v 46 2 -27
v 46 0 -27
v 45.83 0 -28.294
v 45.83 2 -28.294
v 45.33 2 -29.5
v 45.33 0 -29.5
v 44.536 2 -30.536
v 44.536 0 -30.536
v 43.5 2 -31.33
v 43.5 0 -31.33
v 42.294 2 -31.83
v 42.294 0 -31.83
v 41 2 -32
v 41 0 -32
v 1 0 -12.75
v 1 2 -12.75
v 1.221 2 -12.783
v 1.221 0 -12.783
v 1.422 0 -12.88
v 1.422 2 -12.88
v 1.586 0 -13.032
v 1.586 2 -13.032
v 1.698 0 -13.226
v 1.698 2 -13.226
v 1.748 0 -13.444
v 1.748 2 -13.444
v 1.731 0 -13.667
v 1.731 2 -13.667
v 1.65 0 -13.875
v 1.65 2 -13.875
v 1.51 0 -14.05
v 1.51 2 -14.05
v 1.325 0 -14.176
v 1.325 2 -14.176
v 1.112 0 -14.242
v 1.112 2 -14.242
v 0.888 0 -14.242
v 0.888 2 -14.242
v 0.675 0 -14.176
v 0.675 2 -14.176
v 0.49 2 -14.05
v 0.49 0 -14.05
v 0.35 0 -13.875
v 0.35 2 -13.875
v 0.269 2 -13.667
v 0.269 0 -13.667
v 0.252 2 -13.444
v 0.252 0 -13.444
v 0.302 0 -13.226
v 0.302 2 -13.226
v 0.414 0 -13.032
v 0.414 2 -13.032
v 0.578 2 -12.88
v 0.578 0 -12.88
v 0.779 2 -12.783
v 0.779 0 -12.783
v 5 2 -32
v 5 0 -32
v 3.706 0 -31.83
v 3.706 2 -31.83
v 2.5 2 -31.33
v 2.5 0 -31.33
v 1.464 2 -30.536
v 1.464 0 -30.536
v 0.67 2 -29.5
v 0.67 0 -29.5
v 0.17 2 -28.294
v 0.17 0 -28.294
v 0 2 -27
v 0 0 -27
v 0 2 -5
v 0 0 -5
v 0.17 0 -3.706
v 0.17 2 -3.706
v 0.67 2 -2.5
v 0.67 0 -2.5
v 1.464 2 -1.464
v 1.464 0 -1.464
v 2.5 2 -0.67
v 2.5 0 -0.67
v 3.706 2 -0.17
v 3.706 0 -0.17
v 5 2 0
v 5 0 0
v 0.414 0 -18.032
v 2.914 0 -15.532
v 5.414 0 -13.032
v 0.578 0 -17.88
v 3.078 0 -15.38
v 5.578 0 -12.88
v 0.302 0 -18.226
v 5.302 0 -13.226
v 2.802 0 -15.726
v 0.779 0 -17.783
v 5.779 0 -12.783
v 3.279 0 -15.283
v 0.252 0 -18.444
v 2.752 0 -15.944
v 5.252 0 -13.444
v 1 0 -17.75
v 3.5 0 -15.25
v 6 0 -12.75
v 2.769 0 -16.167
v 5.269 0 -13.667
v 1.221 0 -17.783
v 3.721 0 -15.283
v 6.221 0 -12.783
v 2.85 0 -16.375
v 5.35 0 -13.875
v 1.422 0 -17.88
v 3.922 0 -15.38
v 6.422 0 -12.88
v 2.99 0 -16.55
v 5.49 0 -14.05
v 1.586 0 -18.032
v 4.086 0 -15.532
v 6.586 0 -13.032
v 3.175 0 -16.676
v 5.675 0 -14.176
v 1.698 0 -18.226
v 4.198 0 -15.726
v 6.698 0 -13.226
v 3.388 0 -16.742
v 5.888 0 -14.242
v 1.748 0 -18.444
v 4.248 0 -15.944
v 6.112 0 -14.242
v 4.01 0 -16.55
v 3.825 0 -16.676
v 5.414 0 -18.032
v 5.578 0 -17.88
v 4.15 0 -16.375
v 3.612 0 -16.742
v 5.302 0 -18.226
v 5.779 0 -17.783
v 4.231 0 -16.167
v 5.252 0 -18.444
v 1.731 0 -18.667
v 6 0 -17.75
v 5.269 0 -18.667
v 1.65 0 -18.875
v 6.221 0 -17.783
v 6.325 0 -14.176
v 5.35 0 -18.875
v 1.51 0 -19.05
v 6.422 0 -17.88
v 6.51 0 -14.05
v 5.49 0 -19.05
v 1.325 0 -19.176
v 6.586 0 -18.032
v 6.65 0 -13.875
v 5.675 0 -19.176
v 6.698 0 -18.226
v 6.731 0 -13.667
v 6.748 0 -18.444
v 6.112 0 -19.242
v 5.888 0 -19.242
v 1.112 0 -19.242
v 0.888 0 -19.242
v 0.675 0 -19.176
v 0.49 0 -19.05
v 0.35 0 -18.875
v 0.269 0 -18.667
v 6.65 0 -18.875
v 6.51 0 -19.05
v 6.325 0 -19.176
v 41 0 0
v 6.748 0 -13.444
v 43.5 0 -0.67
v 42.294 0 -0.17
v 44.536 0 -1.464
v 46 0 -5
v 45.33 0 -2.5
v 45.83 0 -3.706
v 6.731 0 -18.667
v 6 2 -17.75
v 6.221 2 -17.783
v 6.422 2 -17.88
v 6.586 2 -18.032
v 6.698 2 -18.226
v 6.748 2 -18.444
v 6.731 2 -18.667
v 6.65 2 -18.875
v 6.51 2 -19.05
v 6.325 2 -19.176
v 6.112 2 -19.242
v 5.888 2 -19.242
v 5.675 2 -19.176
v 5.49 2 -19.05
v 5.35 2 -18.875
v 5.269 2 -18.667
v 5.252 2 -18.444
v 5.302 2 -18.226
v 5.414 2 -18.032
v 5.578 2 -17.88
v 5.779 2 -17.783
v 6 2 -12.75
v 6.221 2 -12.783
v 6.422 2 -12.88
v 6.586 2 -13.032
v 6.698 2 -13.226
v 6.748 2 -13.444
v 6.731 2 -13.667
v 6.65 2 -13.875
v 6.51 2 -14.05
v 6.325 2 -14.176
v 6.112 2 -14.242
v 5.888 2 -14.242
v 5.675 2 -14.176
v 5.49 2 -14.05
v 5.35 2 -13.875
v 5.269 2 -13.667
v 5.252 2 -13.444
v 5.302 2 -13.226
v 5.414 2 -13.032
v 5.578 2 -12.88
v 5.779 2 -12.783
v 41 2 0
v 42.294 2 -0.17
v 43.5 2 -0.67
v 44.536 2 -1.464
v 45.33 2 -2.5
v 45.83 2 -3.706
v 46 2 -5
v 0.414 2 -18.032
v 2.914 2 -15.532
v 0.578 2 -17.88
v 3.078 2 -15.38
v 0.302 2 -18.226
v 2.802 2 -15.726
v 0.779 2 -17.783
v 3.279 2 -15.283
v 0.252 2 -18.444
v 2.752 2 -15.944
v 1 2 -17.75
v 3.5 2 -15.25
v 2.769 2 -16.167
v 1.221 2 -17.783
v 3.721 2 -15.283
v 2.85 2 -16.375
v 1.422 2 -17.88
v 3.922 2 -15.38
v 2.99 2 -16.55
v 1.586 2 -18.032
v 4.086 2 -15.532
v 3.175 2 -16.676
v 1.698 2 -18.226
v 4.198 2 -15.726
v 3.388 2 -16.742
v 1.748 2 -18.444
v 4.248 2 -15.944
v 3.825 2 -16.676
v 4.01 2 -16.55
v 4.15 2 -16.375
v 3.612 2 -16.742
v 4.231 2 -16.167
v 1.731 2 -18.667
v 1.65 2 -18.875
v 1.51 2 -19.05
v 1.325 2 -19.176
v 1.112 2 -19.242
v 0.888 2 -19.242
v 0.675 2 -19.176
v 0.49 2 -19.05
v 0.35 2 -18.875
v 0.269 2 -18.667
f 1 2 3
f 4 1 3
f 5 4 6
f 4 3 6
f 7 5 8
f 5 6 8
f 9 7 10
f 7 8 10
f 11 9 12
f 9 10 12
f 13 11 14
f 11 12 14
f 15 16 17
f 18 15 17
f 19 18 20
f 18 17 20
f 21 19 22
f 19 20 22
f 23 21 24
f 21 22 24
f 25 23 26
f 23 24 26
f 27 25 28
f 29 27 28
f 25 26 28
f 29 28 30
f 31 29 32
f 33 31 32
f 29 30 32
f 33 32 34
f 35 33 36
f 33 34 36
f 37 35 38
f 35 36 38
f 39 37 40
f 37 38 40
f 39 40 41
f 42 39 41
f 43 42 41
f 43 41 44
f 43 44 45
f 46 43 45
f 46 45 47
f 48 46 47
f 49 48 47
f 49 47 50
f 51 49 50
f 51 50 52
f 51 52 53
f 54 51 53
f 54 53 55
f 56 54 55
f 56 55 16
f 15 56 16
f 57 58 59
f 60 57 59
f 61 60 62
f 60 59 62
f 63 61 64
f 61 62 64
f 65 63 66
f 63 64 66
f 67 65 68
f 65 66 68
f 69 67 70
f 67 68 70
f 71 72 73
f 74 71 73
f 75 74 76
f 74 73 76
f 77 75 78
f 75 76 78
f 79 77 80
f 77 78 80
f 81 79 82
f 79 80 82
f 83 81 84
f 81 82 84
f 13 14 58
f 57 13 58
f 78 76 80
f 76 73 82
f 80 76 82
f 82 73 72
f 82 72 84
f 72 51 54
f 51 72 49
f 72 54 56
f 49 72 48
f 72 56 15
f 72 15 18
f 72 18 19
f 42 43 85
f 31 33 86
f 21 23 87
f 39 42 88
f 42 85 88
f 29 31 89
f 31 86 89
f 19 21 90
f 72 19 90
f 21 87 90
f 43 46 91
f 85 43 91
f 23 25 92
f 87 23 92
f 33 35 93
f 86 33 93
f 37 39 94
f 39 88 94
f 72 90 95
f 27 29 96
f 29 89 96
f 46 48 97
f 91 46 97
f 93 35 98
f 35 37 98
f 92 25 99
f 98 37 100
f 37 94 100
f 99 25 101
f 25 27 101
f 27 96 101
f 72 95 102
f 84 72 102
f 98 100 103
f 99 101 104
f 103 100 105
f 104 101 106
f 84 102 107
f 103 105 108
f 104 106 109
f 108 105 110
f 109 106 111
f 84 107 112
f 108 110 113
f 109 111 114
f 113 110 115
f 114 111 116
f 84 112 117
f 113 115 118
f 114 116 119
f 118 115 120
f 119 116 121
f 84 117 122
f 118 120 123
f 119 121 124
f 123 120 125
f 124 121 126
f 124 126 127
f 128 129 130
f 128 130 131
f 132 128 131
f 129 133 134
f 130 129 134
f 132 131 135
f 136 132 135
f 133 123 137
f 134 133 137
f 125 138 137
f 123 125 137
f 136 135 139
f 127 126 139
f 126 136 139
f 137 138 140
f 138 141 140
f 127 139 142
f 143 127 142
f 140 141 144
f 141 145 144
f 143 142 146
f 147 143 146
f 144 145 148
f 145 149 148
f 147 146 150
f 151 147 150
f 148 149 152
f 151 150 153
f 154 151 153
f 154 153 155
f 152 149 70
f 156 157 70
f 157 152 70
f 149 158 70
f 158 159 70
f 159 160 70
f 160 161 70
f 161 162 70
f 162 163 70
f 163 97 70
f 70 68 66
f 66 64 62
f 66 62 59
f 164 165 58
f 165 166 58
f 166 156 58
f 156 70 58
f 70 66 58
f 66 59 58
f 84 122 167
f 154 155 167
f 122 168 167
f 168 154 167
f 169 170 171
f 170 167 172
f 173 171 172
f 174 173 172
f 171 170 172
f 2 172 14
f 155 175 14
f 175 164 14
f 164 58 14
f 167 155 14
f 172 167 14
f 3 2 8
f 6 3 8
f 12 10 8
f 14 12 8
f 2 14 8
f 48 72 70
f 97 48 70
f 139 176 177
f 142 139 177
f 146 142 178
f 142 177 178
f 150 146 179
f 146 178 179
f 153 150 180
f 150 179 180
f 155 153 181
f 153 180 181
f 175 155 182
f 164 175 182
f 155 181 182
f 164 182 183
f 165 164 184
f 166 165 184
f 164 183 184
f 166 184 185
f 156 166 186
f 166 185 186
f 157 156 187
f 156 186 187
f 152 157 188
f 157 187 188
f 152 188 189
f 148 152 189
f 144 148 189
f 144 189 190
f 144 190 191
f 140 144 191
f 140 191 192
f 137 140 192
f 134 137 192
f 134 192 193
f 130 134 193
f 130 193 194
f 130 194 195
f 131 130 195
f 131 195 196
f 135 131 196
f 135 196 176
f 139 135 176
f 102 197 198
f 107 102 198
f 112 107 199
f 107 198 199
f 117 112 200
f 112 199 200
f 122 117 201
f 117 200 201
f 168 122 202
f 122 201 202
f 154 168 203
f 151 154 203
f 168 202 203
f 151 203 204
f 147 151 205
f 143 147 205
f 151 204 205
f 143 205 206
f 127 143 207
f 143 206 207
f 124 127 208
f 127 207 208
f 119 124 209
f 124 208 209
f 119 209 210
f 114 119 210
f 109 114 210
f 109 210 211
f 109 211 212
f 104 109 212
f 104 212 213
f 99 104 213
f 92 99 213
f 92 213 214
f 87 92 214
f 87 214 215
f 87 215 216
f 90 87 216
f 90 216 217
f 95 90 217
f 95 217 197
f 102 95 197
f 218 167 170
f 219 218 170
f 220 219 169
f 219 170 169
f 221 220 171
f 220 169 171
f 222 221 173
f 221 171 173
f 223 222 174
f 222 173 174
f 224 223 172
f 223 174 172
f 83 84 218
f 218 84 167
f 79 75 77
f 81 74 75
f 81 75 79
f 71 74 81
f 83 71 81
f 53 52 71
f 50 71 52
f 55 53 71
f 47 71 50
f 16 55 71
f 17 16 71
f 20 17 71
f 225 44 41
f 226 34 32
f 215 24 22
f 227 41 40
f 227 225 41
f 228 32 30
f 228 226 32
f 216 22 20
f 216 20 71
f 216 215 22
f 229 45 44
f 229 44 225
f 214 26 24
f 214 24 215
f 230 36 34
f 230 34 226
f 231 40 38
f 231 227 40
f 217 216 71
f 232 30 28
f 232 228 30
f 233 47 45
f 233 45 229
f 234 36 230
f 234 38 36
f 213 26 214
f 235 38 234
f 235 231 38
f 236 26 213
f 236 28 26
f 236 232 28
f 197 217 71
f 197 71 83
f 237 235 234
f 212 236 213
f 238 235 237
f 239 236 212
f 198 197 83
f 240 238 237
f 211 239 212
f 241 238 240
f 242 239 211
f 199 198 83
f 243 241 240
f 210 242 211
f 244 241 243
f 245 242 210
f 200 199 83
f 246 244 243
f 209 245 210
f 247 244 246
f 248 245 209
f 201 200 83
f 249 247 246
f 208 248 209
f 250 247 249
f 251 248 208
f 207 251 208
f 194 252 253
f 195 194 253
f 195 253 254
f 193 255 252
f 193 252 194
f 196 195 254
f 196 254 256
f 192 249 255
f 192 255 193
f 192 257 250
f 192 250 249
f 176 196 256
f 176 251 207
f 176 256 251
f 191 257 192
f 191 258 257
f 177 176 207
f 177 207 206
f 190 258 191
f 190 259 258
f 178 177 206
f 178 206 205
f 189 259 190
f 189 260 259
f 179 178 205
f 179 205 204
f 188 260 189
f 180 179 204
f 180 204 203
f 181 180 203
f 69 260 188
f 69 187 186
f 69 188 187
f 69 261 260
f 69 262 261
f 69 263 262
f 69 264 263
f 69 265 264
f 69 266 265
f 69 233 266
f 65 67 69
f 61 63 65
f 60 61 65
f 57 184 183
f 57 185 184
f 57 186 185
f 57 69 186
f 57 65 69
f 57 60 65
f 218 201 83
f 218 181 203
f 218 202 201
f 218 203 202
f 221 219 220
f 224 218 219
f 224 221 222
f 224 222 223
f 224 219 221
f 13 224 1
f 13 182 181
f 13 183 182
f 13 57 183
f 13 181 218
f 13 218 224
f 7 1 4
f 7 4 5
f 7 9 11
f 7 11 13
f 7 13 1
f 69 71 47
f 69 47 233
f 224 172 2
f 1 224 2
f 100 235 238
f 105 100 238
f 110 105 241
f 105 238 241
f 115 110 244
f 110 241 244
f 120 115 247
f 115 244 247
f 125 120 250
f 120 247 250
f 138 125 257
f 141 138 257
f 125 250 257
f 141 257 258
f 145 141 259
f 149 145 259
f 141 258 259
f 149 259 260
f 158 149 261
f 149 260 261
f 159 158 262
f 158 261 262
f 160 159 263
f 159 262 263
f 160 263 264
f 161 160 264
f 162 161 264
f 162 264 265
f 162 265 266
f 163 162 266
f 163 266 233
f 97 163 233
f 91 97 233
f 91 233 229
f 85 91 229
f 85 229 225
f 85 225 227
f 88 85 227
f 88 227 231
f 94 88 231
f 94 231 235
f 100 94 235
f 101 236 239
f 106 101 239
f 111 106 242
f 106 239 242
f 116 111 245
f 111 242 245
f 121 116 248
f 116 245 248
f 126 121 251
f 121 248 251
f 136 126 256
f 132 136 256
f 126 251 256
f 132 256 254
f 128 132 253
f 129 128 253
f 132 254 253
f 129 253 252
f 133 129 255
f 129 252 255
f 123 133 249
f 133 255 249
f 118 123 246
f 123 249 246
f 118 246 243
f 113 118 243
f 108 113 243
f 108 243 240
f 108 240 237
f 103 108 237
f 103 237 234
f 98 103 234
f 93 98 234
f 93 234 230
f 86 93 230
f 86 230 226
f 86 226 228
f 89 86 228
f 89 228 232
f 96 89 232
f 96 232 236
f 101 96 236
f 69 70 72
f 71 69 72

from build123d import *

# Parameters (mm, degrees)
BOSS_EXTRUDE1_DEPTH = 2
CUT_EXTRUDE2_REACH  = 58.071
SKETCH8_R           = 0.75


with BuildPart() as part:
    # Sketch1 → Boss-Extrude1 (new body)
    with BuildSketch(Plane(origin=(0, 0, 0), x_dir=(1, 0, 0), z_dir=(0, 1, 0))):
        with BuildLine():
            Line((5, 0), (41, 0))
            ThreePointArc((41, 0), (44.535533906, 1.464466094), (46, 5))
            Line((46, 5), (46, 27))
            ThreePointArc((46, 27), (44.535533906, 30.535533906), (41, 32))
            Line((41, 32), (5, 32))
            ThreePointArc((5, 32), (1.464466094, 30.535533906), (0, 27))
            Line((0, 27), (0, 5))
            ThreePointArc((0, 5), (1.464466094, 1.464466094), (5, 0))
        make_face()
    extrude(amount=BOSS_EXTRUDE1_DEPTH)

    # Sketch8 → Cut-Extrude2 (cut, up to next)
    with BuildSketch(Plane(origin=(0, 2, 0), x_dir=(1, 0, 0), z_dir=(0, 1, 0)), mode=Mode.PRIVATE) as cut_extrude2_sk1:
        with Locations(Location((3.5, 16, 0), (0, 0, 270))):
            Circle(SKETCH8_R)
    cut_extrude2_tool1 = extrude(cut_extrude2_sk1.sketch, amount=-CUT_EXTRUDE2_REACH, mode=Mode.PRIVATE) & part.part
    # Sketch8 → Cut-Extrude2 (cut, up to next)
    with BuildSketch(Plane(origin=(0, 2, 0), x_dir=(1, 0, 0), z_dir=(0, 1, 0)), mode=Mode.PRIVATE) as cut_extrude2_sk2:
        with Locations(Location((6, 18.5, 0), (0, 0, 270))):
            Circle(SKETCH8_R)
    cut_extrude2_tool2 = extrude(cut_extrude2_sk2.sketch, amount=-CUT_EXTRUDE2_REACH, mode=Mode.PRIVATE) & part.part
    # Sketch8 → Cut-Extrude2 (cut, up to next)
    with BuildSketch(Plane(origin=(0, 2, 0), x_dir=(1, 0, 0), z_dir=(0, 1, 0)), mode=Mode.PRIVATE) as cut_extrude2_sk3:
        with Locations(Location((6, 13.5, 0), (0, 0, 270))):
            Circle(SKETCH8_R)
    cut_extrude2_tool3 = extrude(cut_extrude2_sk3.sketch, amount=-CUT_EXTRUDE2_REACH, mode=Mode.PRIVATE) & part.part
    # Sketch8 → Cut-Extrude2 (cut, up to next)
    with BuildSketch(Plane(origin=(0, 2, 0), x_dir=(1, 0, 0), z_dir=(0, 1, 0)), mode=Mode.PRIVATE) as cut_extrude2_sk4:
        with Locations(Location((1, 13.499992953, 0), (0, 0, 270))):
            Circle(SKETCH8_R)
    cut_extrude2_tool4 = extrude(cut_extrude2_sk4.sketch, amount=-CUT_EXTRUDE2_REACH, mode=Mode.PRIVATE) & part.part
    # Sketch8 → Cut-Extrude2 (cut, up to next)
    with BuildSketch(Plane(origin=(0, 2, 0), x_dir=(1, 0, 0), z_dir=(0, 1, 0)), mode=Mode.PRIVATE) as cut_extrude2_sk5:
        with Locations(Location((1, 18.499992953, 0), (0, 0, 270))):
            Circle(SKETCH8_R)
    cut_extrude2_tool5 = extrude(cut_extrude2_sk5.sketch, amount=-CUT_EXTRUDE2_REACH, mode=Mode.PRIVATE) & part.part
    add(cut_extrude2_tool1.solids().sort_by_distance((3.5, 2, -16))[0], mode=Mode.SUBTRACT)
    add(cut_extrude2_tool2.solids().sort_by_distance((6, 2, -18.5))[0], mode=Mode.SUBTRACT)
    add(cut_extrude2_tool3.solids().sort_by_distance((6, 2, -13.5))[0], mode=Mode.SUBTRACT)
    add(cut_extrude2_tool4.solids().sort_by_distance((1, 2, -13.499993))[0], mode=Mode.SUBTRACT)
    add(cut_extrude2_tool5.solids().sort_by_distance((1, 2, -18.499993))[0], mode=Mode.SUBTRACT)


solid = part.part
